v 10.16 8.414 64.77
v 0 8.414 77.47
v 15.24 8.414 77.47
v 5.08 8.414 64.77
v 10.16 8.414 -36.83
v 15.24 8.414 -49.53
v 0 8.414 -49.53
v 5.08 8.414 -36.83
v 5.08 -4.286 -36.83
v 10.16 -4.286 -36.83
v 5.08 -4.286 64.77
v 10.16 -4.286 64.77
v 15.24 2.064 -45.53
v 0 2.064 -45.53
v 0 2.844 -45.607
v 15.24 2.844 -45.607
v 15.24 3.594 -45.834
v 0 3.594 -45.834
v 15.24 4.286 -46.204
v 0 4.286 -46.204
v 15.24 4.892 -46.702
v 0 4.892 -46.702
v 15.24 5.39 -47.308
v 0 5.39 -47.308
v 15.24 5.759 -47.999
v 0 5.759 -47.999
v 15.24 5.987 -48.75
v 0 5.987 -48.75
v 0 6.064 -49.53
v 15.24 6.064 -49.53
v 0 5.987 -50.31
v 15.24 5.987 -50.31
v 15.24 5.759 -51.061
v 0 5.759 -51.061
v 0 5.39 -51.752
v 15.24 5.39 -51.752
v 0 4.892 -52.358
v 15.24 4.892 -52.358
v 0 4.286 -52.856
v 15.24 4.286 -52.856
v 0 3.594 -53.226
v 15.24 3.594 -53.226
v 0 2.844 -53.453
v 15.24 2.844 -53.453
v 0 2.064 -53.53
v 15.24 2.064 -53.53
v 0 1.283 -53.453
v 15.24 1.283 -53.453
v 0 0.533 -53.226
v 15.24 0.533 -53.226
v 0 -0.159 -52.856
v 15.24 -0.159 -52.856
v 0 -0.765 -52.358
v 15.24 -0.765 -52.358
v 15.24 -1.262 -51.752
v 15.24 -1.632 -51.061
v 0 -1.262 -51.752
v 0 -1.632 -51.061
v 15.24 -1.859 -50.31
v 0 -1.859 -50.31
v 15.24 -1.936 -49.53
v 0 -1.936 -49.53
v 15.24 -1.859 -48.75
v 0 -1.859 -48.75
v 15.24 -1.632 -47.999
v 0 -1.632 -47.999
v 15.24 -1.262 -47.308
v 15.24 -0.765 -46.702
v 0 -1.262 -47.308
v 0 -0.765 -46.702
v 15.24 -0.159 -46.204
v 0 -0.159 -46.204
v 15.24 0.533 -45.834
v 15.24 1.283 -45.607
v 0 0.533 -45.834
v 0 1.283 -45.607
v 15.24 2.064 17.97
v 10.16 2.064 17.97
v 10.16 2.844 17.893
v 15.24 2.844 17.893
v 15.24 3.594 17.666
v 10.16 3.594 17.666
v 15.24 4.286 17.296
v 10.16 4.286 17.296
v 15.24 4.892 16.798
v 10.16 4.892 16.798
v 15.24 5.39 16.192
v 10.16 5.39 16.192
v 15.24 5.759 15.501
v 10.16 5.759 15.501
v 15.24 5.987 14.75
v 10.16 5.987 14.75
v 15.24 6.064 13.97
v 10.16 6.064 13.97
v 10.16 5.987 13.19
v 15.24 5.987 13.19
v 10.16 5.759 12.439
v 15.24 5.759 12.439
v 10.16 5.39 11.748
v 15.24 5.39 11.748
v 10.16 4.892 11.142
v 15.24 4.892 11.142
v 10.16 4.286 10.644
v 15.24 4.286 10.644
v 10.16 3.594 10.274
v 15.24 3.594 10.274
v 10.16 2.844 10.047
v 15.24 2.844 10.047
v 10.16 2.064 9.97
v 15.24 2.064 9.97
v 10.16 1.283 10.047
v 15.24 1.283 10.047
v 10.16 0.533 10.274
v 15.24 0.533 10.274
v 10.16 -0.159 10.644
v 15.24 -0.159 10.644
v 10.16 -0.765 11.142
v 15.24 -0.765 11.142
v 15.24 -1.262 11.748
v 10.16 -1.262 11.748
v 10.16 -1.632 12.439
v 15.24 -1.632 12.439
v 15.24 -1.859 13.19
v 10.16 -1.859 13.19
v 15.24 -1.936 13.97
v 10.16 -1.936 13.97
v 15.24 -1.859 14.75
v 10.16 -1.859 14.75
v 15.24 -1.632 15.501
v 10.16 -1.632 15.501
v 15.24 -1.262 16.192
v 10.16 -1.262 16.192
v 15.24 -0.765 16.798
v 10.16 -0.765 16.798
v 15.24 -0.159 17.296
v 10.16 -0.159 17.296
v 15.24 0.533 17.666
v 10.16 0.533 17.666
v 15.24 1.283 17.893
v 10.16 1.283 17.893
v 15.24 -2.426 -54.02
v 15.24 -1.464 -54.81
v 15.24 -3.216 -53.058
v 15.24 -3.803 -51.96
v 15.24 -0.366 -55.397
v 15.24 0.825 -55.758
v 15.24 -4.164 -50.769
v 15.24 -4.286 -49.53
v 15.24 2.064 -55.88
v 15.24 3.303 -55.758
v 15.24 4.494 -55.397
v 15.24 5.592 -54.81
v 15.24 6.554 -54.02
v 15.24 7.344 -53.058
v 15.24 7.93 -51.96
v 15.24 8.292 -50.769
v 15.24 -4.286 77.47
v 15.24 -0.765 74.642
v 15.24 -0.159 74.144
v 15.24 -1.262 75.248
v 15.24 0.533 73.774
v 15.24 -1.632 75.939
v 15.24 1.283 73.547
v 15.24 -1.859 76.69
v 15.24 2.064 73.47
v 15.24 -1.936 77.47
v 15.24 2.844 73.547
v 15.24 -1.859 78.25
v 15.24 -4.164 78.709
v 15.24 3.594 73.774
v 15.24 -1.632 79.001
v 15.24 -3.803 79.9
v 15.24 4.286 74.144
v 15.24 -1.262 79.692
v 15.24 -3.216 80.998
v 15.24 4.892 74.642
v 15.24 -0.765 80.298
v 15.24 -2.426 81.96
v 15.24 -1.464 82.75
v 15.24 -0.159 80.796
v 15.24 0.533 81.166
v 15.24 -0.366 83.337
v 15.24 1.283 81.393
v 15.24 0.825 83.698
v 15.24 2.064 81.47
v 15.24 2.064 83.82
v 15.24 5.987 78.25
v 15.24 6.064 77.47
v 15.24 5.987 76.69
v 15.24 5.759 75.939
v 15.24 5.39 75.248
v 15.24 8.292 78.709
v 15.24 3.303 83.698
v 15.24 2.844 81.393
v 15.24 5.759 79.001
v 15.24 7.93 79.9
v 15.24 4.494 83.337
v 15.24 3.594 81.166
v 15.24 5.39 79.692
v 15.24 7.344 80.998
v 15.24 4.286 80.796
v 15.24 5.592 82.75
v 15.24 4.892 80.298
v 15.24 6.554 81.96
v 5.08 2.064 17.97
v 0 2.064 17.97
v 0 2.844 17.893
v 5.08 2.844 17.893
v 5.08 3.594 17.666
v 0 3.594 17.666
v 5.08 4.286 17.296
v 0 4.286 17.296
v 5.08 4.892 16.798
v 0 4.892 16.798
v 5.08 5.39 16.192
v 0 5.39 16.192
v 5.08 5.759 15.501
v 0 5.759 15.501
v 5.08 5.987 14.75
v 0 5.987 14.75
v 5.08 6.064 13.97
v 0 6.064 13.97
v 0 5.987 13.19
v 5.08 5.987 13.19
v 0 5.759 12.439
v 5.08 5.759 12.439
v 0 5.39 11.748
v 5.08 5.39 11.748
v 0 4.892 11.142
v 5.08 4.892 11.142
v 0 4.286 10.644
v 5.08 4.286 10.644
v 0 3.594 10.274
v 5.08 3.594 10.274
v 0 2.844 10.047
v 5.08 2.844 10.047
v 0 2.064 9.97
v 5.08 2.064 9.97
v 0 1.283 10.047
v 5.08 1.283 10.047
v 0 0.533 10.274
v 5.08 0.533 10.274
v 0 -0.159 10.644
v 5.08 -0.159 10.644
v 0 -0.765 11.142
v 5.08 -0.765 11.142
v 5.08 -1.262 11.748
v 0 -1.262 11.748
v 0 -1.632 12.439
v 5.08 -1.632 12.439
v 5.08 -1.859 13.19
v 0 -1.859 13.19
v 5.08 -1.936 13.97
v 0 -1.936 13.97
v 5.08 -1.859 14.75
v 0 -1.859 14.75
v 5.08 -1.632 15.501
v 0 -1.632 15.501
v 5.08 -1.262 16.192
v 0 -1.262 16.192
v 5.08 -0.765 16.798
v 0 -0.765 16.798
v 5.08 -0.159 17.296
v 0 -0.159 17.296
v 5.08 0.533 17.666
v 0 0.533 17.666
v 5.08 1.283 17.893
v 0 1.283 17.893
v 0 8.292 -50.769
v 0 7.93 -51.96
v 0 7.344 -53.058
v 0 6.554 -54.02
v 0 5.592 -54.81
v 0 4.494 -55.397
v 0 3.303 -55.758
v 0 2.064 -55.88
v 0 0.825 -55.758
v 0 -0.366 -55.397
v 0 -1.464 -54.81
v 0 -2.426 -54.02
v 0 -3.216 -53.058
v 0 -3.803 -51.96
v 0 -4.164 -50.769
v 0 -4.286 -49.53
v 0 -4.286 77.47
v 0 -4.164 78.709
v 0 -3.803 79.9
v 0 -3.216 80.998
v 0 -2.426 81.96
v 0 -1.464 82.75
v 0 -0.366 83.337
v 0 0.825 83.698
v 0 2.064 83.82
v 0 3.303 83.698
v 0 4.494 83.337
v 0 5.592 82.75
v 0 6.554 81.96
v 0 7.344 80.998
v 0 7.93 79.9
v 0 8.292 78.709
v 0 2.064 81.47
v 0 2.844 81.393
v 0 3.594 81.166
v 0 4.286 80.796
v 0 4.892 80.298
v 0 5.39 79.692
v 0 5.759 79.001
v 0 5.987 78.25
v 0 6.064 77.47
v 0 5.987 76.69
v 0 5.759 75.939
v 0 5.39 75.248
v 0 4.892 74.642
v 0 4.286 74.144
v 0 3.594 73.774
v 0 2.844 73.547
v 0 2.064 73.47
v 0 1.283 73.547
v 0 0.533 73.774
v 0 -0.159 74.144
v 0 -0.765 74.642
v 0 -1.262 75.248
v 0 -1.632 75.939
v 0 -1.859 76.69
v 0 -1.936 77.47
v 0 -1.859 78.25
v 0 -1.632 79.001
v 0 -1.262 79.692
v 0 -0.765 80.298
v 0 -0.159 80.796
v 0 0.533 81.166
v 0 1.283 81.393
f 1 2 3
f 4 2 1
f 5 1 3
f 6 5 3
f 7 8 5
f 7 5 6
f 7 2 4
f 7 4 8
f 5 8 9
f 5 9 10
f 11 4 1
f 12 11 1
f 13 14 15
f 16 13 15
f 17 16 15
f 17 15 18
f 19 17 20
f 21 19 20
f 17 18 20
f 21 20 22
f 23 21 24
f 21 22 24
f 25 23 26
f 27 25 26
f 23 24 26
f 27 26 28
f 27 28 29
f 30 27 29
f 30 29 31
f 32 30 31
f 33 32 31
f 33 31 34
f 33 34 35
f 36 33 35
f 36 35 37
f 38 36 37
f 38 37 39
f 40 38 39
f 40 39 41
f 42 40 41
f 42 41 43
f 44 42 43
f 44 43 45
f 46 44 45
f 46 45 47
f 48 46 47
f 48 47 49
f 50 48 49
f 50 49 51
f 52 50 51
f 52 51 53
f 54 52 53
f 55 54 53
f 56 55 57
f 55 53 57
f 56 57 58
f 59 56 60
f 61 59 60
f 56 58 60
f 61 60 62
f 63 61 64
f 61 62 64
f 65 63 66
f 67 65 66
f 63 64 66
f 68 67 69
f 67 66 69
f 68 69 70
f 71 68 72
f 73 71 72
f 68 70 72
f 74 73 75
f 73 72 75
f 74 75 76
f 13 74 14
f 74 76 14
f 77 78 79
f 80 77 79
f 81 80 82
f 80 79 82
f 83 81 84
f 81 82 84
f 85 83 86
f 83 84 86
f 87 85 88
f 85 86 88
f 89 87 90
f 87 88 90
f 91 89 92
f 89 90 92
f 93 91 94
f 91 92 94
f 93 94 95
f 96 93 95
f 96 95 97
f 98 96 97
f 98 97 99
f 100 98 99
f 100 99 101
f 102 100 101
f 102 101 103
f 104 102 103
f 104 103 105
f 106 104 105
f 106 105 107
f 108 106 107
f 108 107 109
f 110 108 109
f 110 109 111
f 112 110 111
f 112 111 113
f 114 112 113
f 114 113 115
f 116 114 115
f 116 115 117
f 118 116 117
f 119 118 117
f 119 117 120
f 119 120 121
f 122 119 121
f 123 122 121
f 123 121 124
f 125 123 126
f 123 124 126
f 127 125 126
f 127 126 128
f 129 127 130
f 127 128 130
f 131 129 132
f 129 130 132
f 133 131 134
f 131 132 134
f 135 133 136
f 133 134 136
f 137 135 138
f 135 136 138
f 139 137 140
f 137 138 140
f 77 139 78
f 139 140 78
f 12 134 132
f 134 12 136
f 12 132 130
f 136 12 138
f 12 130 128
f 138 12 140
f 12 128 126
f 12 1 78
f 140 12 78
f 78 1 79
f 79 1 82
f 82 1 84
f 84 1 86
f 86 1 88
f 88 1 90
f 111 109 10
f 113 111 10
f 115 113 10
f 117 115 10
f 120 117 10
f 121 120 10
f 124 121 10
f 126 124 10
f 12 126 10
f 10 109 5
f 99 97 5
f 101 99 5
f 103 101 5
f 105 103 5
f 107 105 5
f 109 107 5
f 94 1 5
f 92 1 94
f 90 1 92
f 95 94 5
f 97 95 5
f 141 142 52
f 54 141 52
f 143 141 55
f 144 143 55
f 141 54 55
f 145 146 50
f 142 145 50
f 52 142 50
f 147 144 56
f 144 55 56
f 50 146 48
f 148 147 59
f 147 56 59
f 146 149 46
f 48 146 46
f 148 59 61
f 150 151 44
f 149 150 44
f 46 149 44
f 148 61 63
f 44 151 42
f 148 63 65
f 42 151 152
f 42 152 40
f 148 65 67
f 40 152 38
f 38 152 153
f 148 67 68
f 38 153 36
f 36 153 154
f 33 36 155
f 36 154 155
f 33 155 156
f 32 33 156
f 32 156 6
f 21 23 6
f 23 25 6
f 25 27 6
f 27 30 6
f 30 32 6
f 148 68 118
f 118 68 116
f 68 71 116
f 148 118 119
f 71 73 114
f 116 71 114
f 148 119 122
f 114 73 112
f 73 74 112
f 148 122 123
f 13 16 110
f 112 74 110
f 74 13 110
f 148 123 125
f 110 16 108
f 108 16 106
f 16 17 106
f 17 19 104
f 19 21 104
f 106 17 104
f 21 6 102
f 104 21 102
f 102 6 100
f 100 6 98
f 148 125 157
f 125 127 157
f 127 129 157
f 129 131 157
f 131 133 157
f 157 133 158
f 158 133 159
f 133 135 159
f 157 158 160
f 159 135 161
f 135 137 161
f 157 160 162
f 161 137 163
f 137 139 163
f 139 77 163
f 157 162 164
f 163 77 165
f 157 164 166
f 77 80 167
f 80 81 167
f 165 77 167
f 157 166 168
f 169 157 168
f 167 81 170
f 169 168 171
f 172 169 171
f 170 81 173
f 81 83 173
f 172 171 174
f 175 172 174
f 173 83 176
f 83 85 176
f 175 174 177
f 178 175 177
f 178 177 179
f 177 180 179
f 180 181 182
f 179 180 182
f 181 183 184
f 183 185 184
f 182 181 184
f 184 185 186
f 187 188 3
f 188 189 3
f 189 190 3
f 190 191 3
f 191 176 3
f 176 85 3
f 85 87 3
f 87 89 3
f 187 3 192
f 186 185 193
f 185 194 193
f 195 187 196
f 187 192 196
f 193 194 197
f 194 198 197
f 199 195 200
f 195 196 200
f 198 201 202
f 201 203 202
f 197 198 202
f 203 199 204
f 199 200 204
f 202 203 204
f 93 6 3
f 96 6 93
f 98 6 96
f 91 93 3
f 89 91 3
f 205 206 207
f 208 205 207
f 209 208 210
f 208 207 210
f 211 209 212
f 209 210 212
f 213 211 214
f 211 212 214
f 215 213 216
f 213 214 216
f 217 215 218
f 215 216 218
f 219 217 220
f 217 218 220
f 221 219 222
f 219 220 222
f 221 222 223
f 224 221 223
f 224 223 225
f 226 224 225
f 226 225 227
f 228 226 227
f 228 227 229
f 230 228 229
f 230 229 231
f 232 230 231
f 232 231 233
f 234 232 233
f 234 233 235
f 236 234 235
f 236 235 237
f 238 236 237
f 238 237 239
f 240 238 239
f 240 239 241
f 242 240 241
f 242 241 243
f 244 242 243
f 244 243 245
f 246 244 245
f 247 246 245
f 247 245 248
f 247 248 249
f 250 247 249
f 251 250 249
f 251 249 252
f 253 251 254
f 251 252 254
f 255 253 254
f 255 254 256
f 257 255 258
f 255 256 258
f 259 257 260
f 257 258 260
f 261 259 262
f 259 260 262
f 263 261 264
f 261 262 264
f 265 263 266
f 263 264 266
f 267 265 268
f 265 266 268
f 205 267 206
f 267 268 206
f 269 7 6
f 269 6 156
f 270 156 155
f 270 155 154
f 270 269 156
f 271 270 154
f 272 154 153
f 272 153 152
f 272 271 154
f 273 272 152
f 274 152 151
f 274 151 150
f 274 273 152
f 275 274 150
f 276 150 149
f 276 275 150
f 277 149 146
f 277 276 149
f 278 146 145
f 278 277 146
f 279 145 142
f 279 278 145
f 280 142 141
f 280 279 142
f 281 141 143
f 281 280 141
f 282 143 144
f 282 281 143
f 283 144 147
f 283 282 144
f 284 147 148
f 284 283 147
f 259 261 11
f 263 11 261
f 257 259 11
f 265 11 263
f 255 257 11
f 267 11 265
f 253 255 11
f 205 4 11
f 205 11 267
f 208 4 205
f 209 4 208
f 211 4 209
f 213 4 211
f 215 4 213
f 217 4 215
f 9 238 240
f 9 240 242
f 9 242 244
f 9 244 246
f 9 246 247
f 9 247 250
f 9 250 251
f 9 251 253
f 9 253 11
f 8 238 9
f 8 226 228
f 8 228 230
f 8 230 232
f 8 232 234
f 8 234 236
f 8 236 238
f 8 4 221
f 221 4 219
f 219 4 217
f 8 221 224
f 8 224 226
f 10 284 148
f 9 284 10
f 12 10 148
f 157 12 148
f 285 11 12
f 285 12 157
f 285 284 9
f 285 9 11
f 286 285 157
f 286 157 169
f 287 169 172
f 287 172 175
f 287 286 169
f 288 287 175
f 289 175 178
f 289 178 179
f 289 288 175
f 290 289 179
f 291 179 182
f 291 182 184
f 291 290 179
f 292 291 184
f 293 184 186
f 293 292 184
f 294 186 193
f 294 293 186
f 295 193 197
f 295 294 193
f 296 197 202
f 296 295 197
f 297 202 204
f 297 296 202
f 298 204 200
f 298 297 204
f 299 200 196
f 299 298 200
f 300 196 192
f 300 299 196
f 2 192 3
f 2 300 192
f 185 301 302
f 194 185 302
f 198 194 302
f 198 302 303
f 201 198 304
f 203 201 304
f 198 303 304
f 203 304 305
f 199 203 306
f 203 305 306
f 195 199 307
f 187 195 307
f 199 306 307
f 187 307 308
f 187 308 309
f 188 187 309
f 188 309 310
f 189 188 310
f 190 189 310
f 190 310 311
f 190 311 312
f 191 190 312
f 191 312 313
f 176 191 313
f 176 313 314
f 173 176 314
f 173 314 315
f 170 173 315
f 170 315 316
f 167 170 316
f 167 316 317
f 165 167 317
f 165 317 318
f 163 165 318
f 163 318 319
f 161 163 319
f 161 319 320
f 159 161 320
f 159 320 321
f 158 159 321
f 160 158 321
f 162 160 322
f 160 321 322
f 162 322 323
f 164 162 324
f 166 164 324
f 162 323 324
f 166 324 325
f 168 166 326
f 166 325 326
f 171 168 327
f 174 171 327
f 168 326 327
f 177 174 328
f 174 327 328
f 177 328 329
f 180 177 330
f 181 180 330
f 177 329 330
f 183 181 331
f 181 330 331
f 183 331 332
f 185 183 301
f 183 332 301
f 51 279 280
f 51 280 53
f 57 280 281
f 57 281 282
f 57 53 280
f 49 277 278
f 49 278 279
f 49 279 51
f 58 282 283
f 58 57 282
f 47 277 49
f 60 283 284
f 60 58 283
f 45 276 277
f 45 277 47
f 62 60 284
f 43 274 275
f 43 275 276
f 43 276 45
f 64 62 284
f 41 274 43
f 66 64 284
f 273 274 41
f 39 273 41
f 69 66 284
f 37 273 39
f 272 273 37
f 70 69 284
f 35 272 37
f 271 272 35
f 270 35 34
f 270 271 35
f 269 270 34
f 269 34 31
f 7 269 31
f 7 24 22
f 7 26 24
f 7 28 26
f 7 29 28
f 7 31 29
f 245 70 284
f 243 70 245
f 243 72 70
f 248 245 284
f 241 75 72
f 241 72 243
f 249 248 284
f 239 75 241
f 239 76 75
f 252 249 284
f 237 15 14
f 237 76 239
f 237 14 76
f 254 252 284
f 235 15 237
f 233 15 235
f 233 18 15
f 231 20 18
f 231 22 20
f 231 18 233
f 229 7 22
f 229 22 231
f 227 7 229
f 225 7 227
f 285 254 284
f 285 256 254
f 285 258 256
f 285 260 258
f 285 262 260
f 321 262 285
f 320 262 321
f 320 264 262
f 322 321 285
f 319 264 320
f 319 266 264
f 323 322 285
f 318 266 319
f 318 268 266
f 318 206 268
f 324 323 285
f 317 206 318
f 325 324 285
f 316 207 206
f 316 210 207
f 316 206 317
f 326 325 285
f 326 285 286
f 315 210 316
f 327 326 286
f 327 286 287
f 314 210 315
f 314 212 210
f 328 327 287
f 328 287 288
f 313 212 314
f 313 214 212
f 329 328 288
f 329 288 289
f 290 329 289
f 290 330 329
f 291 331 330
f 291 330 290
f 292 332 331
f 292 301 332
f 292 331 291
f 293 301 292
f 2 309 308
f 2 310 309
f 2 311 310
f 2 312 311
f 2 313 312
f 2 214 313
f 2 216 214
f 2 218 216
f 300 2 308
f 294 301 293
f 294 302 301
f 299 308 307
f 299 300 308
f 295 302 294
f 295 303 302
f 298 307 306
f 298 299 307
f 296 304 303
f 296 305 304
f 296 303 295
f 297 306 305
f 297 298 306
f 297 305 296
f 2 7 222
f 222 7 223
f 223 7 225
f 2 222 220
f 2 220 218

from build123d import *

# Parameters (mm, degrees)
BOSS_EXTRUDE1_DEPTH   = 15.24
F_8_0MM_DOWEL_HOLE1_D = 8
SKETCH5_W             = 5.08
SKETCH5_H             = 101.6
CUT_EXTRUDE1_DEPTH    = 87.135590786


with BuildPart() as part:
    # Sketch1 → Boss-Extrude1 (new body)
    with BuildSketch(Plane(origin=(0, 0, 0), x_dir=(0, 0, -1), z_dir=(1, 0, 0))):
        with BuildLine():
            Line((-77.47, 8.41375), (49.53, 8.41375))
            ThreePointArc((49.53, 8.41375), (55.88, 2.06375), (49.53, -4.28625))
            Line((49.53, -4.28625), (-77.47, -4.28625))
            ThreePointArc((-77.47, -4.28625), (-83.82, 2.06375), (-77.47, 8.41375))
        make_face()
    extrude(amount=BOSS_EXTRUDE1_DEPTH)

    # Ø8.0mm Dowel Hole1 (through all)
    with Locations(Plane(origin=(15.24, 0, 0), x_dir=(0, 0, -1), z_dir=(1, 0, 0))):
        with Locations((-77.47, 2.06375), (49.53, 2.06375), (-13.97, 2.06375)):
            Hole(F_8_0MM_DOWEL_HOLE1_D / 2)

    # Sketch5 → Cut-Extrude1 (cut, through all)
    with BuildSketch(Plane(origin=(0, 8.41375, 0), x_dir=(1, 0, 0), z_dir=(0, 1, 0))):
        with Locations((7.62, -13.97)):
            Rectangle(SKETCH5_W, SKETCH5_H)
    extrude(amount=-CUT_EXTRUDE1_DEPTH, mode=Mode.SUBTRACT)


solid = part.part
